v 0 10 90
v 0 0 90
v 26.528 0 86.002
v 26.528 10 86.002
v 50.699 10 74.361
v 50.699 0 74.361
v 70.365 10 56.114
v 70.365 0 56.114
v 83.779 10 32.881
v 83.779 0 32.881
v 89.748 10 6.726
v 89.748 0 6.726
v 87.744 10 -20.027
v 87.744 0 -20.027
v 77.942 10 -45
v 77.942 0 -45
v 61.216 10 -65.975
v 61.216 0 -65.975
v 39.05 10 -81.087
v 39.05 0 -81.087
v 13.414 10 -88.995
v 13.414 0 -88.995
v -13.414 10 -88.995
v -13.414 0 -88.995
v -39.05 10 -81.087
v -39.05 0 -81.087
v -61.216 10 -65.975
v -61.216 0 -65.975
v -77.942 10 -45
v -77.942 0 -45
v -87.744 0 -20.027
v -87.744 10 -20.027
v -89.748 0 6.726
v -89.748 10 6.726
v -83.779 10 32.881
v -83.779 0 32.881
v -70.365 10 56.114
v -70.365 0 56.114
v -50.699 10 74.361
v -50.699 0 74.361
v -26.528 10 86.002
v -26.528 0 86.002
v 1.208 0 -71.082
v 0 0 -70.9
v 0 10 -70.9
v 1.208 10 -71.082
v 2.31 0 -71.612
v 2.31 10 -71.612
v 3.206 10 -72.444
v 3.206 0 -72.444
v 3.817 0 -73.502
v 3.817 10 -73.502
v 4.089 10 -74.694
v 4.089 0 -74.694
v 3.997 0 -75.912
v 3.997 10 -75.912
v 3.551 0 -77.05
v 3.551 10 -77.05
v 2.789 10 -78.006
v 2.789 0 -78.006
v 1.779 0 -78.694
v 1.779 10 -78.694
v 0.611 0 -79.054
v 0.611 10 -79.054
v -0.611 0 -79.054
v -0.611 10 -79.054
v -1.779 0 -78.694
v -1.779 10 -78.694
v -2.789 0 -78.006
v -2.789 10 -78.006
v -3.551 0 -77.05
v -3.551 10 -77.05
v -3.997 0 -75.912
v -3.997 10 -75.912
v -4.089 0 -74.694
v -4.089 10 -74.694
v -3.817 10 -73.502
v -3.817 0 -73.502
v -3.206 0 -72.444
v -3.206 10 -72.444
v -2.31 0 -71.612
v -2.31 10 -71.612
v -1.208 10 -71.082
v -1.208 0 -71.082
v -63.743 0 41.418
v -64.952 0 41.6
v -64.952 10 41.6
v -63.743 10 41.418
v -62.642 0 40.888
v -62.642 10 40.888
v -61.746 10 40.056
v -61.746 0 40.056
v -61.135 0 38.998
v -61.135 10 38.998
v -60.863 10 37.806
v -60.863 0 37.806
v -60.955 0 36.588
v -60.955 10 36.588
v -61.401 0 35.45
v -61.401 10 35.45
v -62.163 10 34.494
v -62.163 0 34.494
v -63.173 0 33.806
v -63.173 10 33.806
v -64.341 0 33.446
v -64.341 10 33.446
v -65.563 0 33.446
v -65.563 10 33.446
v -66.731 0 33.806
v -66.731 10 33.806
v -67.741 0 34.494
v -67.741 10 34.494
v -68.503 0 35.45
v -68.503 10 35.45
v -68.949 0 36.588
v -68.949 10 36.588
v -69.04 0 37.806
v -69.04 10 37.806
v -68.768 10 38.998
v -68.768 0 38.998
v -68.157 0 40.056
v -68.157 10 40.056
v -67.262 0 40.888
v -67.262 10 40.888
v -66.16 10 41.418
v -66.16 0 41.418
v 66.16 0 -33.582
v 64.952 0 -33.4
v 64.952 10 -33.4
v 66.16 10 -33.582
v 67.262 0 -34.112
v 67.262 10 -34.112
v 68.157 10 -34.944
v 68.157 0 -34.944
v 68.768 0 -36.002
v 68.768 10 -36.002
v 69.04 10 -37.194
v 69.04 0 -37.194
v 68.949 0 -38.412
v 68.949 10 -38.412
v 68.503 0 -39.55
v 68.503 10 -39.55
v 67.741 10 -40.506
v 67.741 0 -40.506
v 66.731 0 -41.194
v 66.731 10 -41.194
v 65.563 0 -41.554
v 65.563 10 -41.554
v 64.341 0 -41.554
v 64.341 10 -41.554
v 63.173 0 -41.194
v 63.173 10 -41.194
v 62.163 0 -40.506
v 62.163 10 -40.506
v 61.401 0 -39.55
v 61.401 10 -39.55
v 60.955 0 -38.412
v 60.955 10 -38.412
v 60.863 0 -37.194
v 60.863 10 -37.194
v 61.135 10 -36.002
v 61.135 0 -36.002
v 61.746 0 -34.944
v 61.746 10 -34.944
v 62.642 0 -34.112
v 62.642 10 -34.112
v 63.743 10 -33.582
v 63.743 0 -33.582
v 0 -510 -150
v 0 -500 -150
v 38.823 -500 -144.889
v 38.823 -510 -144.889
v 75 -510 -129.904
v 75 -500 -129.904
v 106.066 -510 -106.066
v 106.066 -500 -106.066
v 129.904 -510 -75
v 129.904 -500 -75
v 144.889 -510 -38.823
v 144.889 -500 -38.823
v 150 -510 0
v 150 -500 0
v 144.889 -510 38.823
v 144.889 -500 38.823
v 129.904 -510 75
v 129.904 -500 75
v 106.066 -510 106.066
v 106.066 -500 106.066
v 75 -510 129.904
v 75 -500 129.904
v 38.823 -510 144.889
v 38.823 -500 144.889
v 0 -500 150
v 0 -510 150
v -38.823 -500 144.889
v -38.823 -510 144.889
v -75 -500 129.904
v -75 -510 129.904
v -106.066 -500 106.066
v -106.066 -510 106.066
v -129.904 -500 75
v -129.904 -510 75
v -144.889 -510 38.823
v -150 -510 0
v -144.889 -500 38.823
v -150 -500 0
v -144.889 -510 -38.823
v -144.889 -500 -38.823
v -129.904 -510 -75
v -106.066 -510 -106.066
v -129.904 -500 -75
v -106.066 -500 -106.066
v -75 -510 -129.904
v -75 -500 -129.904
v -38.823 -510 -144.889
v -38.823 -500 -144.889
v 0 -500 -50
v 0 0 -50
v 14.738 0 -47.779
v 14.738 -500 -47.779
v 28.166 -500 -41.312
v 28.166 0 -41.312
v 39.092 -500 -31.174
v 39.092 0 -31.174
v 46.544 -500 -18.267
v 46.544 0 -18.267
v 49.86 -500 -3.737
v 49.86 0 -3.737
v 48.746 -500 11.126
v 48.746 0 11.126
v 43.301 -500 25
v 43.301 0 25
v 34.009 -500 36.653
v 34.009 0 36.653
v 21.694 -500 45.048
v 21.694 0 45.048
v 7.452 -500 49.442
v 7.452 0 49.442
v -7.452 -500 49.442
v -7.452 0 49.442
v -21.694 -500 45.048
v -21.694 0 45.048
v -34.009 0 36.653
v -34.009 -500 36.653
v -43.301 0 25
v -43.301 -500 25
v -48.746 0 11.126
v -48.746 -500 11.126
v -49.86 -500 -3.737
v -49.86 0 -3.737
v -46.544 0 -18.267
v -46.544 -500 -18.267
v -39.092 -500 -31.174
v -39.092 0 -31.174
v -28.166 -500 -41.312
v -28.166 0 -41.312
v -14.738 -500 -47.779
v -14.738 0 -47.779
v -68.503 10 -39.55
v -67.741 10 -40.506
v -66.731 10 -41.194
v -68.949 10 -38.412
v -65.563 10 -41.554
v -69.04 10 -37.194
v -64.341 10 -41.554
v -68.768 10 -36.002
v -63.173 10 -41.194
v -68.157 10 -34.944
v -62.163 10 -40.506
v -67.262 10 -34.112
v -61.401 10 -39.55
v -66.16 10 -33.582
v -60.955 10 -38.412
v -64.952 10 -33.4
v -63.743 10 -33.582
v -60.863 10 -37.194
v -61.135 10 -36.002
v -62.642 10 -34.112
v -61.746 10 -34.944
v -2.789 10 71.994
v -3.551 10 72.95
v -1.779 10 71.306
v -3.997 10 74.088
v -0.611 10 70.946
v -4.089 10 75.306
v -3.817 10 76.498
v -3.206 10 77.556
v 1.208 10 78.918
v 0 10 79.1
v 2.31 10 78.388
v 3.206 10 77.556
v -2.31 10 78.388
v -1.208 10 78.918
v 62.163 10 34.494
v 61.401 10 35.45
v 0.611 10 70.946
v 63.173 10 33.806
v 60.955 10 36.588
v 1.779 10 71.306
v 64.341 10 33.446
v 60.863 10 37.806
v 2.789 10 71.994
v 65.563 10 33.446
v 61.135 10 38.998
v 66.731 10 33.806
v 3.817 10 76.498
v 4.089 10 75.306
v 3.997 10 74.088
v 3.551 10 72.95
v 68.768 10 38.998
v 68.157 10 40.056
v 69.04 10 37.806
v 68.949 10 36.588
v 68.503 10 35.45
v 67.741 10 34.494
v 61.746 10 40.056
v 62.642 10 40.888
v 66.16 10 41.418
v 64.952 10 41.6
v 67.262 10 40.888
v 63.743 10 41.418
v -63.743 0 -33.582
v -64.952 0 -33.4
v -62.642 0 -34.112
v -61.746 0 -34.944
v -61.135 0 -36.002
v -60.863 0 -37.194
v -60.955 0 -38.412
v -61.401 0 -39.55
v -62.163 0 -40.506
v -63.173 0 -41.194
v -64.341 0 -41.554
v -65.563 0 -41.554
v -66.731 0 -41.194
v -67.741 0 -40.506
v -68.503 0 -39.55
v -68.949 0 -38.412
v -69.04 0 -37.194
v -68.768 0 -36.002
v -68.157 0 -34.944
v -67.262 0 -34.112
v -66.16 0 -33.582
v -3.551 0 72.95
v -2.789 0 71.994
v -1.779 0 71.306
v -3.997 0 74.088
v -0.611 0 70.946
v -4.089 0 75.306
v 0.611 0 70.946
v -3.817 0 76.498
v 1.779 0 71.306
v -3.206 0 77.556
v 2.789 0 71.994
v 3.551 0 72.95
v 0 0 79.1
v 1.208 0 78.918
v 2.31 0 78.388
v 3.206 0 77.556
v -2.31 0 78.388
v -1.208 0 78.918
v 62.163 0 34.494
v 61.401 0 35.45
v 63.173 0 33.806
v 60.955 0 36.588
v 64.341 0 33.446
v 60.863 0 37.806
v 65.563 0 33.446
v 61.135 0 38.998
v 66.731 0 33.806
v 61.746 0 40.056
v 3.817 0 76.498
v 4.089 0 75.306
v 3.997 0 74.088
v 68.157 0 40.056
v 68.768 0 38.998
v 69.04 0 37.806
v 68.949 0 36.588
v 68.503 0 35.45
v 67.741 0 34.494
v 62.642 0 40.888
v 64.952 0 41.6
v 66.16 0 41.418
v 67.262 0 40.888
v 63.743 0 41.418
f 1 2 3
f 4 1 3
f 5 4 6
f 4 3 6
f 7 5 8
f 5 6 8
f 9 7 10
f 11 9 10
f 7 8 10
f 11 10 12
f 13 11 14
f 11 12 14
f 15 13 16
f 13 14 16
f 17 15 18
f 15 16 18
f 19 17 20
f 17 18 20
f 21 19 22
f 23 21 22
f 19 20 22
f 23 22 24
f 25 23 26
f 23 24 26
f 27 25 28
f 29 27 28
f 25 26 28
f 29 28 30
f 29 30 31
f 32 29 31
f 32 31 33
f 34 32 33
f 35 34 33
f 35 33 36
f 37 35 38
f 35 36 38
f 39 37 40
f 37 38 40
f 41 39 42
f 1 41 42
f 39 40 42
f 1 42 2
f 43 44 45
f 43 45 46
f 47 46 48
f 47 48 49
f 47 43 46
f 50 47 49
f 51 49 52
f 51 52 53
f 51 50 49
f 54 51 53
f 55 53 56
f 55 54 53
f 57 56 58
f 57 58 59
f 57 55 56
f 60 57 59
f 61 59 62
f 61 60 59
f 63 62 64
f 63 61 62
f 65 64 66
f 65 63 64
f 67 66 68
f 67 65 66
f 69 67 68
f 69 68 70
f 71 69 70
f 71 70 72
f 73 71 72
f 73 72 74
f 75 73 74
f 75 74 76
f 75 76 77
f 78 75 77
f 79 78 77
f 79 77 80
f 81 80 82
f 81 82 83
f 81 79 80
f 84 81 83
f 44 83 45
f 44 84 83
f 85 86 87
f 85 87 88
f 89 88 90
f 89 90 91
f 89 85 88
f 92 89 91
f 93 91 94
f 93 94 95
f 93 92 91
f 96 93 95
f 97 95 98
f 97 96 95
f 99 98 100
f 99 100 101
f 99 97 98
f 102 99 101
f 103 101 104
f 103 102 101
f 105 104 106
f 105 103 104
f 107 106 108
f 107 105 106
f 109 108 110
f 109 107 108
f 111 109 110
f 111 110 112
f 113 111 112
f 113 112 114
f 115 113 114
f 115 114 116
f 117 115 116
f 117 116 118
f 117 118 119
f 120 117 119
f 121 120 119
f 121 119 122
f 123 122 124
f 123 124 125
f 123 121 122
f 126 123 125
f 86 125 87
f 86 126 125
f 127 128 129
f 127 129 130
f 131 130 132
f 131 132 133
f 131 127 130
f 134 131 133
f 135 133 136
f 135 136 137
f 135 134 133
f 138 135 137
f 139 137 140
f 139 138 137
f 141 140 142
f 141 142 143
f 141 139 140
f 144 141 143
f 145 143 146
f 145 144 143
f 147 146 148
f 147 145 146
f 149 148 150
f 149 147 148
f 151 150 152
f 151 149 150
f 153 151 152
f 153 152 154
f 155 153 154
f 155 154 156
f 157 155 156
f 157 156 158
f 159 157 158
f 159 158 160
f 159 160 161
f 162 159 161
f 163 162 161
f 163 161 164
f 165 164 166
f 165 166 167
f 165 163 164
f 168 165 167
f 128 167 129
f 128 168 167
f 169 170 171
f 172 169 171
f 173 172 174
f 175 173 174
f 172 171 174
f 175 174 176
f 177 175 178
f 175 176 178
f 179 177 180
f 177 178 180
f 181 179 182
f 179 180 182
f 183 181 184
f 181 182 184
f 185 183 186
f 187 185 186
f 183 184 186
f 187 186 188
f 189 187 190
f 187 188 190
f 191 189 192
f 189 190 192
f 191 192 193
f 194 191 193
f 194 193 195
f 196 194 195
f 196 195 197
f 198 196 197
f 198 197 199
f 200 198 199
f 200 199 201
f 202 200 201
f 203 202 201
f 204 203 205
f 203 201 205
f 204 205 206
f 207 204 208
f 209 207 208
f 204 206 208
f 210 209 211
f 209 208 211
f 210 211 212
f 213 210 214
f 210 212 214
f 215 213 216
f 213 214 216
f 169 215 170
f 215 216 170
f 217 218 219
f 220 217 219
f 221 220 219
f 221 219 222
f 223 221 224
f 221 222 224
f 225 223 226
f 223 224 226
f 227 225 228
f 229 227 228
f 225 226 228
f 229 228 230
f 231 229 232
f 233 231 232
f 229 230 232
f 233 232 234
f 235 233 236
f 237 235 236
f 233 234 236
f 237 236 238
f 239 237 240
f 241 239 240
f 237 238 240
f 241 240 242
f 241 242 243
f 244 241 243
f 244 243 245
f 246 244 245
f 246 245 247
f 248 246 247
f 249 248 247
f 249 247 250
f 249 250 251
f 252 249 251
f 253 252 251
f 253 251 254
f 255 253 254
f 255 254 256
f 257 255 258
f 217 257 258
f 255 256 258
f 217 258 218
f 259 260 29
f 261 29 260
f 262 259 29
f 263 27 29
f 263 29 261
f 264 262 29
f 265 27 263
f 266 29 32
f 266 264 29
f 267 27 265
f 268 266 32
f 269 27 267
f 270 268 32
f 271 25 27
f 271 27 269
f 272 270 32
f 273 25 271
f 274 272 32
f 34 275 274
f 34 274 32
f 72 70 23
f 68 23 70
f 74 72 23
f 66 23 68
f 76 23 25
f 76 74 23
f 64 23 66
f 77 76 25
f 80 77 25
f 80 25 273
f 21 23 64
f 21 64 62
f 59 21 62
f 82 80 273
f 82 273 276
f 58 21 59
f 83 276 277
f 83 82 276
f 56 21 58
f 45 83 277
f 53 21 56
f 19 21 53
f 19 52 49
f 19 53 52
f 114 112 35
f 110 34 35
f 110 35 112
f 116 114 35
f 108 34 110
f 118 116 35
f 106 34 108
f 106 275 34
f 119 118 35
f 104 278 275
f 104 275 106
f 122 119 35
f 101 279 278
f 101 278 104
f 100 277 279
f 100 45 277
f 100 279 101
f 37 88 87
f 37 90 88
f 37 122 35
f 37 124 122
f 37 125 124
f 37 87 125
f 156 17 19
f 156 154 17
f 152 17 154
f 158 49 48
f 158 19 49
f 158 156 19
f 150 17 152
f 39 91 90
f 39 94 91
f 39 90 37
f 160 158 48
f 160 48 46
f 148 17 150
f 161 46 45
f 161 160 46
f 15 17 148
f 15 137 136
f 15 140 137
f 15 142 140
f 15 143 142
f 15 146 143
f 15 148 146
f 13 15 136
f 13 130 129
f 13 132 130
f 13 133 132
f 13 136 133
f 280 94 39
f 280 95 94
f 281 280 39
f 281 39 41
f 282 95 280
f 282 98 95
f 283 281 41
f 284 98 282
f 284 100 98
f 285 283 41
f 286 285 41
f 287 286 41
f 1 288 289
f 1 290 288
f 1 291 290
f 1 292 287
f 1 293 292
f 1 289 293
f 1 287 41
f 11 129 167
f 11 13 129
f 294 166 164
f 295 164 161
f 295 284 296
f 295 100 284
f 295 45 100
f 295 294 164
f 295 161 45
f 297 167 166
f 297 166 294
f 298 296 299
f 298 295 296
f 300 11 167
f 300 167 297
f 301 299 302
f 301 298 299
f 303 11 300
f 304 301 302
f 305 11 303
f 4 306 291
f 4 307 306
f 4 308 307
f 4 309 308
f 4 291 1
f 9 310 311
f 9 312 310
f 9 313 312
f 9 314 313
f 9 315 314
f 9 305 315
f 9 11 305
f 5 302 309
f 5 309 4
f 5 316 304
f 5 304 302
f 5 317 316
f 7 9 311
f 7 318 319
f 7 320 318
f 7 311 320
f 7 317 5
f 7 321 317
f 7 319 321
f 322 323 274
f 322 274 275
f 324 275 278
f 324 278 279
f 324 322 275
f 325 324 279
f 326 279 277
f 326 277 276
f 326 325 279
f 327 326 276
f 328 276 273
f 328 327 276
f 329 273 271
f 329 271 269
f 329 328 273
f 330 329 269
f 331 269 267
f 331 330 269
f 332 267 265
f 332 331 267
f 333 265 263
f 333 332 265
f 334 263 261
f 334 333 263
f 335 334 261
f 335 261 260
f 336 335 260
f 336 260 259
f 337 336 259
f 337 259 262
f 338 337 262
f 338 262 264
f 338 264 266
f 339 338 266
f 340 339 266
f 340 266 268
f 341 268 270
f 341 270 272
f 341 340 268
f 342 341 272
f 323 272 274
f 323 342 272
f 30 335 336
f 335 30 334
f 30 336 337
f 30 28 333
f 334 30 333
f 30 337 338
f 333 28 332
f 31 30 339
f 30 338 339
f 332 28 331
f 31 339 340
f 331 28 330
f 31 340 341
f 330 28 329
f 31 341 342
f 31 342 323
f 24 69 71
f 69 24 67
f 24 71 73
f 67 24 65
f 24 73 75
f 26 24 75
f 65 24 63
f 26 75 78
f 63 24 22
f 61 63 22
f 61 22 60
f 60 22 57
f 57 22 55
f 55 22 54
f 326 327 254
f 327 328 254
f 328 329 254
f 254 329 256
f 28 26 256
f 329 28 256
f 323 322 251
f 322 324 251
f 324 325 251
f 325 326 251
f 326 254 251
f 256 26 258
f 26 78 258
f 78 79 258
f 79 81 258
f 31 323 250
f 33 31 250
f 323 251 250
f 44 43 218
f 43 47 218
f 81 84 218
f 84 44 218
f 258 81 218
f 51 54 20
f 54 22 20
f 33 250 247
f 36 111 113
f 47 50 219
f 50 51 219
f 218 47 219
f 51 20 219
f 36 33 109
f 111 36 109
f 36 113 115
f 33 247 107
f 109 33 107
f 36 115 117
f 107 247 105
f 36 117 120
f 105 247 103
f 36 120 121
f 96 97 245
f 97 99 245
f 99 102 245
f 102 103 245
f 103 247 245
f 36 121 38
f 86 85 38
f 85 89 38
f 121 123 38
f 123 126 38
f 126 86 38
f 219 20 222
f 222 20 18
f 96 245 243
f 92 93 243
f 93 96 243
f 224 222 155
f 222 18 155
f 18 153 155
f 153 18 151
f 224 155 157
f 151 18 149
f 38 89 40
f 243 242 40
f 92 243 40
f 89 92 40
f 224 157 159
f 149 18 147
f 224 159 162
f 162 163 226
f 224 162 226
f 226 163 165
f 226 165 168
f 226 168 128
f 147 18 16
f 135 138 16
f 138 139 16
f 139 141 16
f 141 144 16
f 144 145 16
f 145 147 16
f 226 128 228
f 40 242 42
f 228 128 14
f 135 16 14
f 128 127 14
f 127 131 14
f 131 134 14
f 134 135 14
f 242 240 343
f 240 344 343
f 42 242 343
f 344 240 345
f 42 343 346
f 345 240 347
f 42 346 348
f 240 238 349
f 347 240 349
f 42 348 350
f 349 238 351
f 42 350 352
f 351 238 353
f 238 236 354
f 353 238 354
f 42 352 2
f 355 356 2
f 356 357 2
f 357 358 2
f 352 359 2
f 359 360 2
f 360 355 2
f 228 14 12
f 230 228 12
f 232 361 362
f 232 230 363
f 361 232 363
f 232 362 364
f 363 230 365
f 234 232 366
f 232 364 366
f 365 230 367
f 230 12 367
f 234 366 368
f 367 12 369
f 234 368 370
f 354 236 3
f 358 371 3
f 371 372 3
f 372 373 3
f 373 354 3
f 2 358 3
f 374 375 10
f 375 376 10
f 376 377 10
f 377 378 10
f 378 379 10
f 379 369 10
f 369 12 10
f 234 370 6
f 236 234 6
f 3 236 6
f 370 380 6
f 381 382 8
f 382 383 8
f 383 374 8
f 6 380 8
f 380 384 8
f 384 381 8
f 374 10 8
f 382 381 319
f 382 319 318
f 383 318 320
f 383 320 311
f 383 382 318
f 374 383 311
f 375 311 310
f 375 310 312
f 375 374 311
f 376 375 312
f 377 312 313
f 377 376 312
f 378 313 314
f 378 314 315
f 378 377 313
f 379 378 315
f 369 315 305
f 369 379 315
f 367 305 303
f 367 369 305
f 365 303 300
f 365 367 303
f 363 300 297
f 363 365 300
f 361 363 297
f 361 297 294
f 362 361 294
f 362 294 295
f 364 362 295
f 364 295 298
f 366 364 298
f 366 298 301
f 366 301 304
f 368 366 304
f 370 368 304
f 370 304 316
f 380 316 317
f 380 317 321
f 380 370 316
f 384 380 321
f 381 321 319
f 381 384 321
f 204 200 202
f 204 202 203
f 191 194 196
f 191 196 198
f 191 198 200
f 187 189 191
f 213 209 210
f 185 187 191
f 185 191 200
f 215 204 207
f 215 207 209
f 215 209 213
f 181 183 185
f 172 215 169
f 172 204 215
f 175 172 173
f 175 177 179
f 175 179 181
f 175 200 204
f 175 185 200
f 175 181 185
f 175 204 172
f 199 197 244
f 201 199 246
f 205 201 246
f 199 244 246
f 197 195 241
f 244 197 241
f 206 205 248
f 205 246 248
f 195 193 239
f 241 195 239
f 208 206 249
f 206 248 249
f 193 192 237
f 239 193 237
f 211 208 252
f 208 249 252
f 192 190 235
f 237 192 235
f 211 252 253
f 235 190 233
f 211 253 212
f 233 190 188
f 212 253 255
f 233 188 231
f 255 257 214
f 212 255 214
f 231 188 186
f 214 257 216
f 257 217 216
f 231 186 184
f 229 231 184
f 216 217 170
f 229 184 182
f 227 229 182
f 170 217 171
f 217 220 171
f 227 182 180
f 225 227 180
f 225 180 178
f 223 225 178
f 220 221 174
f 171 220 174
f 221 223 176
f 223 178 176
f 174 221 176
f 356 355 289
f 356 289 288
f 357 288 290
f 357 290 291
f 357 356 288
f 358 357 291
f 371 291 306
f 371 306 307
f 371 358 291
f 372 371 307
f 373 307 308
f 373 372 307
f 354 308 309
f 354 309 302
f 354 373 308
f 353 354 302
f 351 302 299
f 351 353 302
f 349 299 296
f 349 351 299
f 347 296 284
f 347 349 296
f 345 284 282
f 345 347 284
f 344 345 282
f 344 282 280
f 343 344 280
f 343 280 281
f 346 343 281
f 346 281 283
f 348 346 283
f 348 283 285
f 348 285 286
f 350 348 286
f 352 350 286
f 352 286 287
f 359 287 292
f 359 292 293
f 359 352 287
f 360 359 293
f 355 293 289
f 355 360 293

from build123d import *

# Parameters (mm, degrees)
SKETCH_1_R      = 90
SKETCH_1_R_2    = 4.1
EXTRUDE_1_DEPTH = 10
SKETCH_2_R      = 50
EXTRUDE_2_DEPTH = 500
SKETCH_3_R      = 150
EXTRUDE_3_DEPTH = 10


with BuildPart() as part:
    # 草图1 → 凸台-拉伸1 (new body)
    with BuildSketch(Plane(origin=(0, 0, 0), x_dir=(1, 0, 0), z_dir=(0, 1, 0))):
        with Locations(Location((0, 0, 0), (0, 0, 270))):
            Circle(SKETCH_1_R)
        with Locations(Location((0, -75, 0), (0, 0, 270))):
            Circle(SKETCH_1_R_2, mode=Mode.SUBTRACT)
        with Locations(Location((-64.951905284, -37.5, 0), (0, 0, 270))):
            Circle(SKETCH_1_R_2, mode=Mode.SUBTRACT)
        with Locations(Location((-64.951905284, 37.5, 0), (0, 0, 270))):
            Circle(SKETCH_1_R_2, mode=Mode.SUBTRACT)
        with Locations(Location((0, 75, 0), (0, 0, 270))):
            Circle(SKETCH_1_R_2, mode=Mode.SUBTRACT)
        with Locations(Location((64.951905284, 37.5, 0), (0, 0, 270))):
            Circle(SKETCH_1_R_2, mode=Mode.SUBTRACT)
        with Locations(Location((64.951905284, -37.5, 0), (0, 0, 270))):
            Circle(SKETCH_1_R_2, mode=Mode.SUBTRACT)
    extrude(amount=EXTRUDE_1_DEPTH)

    # 草图2 → 凸台-拉伸2 (add)
    with BuildSketch(Plane.XZ):
        with Locations(Location((0, 0, 0), (0, 0, 270))):
            Circle(SKETCH_2_R)
    extrude(amount=EXTRUDE_2_DEPTH)

    # 草图3 → 凸台-拉伸3 (add)
    with BuildSketch(Plane.XZ.offset(500)):
        with Locations(Location((0, 0, 0), (0, 0, 270))):
            Circle(SKETCH_3_R)
    extrude(amount=EXTRUDE_3_DEPTH)


solid = part.part
